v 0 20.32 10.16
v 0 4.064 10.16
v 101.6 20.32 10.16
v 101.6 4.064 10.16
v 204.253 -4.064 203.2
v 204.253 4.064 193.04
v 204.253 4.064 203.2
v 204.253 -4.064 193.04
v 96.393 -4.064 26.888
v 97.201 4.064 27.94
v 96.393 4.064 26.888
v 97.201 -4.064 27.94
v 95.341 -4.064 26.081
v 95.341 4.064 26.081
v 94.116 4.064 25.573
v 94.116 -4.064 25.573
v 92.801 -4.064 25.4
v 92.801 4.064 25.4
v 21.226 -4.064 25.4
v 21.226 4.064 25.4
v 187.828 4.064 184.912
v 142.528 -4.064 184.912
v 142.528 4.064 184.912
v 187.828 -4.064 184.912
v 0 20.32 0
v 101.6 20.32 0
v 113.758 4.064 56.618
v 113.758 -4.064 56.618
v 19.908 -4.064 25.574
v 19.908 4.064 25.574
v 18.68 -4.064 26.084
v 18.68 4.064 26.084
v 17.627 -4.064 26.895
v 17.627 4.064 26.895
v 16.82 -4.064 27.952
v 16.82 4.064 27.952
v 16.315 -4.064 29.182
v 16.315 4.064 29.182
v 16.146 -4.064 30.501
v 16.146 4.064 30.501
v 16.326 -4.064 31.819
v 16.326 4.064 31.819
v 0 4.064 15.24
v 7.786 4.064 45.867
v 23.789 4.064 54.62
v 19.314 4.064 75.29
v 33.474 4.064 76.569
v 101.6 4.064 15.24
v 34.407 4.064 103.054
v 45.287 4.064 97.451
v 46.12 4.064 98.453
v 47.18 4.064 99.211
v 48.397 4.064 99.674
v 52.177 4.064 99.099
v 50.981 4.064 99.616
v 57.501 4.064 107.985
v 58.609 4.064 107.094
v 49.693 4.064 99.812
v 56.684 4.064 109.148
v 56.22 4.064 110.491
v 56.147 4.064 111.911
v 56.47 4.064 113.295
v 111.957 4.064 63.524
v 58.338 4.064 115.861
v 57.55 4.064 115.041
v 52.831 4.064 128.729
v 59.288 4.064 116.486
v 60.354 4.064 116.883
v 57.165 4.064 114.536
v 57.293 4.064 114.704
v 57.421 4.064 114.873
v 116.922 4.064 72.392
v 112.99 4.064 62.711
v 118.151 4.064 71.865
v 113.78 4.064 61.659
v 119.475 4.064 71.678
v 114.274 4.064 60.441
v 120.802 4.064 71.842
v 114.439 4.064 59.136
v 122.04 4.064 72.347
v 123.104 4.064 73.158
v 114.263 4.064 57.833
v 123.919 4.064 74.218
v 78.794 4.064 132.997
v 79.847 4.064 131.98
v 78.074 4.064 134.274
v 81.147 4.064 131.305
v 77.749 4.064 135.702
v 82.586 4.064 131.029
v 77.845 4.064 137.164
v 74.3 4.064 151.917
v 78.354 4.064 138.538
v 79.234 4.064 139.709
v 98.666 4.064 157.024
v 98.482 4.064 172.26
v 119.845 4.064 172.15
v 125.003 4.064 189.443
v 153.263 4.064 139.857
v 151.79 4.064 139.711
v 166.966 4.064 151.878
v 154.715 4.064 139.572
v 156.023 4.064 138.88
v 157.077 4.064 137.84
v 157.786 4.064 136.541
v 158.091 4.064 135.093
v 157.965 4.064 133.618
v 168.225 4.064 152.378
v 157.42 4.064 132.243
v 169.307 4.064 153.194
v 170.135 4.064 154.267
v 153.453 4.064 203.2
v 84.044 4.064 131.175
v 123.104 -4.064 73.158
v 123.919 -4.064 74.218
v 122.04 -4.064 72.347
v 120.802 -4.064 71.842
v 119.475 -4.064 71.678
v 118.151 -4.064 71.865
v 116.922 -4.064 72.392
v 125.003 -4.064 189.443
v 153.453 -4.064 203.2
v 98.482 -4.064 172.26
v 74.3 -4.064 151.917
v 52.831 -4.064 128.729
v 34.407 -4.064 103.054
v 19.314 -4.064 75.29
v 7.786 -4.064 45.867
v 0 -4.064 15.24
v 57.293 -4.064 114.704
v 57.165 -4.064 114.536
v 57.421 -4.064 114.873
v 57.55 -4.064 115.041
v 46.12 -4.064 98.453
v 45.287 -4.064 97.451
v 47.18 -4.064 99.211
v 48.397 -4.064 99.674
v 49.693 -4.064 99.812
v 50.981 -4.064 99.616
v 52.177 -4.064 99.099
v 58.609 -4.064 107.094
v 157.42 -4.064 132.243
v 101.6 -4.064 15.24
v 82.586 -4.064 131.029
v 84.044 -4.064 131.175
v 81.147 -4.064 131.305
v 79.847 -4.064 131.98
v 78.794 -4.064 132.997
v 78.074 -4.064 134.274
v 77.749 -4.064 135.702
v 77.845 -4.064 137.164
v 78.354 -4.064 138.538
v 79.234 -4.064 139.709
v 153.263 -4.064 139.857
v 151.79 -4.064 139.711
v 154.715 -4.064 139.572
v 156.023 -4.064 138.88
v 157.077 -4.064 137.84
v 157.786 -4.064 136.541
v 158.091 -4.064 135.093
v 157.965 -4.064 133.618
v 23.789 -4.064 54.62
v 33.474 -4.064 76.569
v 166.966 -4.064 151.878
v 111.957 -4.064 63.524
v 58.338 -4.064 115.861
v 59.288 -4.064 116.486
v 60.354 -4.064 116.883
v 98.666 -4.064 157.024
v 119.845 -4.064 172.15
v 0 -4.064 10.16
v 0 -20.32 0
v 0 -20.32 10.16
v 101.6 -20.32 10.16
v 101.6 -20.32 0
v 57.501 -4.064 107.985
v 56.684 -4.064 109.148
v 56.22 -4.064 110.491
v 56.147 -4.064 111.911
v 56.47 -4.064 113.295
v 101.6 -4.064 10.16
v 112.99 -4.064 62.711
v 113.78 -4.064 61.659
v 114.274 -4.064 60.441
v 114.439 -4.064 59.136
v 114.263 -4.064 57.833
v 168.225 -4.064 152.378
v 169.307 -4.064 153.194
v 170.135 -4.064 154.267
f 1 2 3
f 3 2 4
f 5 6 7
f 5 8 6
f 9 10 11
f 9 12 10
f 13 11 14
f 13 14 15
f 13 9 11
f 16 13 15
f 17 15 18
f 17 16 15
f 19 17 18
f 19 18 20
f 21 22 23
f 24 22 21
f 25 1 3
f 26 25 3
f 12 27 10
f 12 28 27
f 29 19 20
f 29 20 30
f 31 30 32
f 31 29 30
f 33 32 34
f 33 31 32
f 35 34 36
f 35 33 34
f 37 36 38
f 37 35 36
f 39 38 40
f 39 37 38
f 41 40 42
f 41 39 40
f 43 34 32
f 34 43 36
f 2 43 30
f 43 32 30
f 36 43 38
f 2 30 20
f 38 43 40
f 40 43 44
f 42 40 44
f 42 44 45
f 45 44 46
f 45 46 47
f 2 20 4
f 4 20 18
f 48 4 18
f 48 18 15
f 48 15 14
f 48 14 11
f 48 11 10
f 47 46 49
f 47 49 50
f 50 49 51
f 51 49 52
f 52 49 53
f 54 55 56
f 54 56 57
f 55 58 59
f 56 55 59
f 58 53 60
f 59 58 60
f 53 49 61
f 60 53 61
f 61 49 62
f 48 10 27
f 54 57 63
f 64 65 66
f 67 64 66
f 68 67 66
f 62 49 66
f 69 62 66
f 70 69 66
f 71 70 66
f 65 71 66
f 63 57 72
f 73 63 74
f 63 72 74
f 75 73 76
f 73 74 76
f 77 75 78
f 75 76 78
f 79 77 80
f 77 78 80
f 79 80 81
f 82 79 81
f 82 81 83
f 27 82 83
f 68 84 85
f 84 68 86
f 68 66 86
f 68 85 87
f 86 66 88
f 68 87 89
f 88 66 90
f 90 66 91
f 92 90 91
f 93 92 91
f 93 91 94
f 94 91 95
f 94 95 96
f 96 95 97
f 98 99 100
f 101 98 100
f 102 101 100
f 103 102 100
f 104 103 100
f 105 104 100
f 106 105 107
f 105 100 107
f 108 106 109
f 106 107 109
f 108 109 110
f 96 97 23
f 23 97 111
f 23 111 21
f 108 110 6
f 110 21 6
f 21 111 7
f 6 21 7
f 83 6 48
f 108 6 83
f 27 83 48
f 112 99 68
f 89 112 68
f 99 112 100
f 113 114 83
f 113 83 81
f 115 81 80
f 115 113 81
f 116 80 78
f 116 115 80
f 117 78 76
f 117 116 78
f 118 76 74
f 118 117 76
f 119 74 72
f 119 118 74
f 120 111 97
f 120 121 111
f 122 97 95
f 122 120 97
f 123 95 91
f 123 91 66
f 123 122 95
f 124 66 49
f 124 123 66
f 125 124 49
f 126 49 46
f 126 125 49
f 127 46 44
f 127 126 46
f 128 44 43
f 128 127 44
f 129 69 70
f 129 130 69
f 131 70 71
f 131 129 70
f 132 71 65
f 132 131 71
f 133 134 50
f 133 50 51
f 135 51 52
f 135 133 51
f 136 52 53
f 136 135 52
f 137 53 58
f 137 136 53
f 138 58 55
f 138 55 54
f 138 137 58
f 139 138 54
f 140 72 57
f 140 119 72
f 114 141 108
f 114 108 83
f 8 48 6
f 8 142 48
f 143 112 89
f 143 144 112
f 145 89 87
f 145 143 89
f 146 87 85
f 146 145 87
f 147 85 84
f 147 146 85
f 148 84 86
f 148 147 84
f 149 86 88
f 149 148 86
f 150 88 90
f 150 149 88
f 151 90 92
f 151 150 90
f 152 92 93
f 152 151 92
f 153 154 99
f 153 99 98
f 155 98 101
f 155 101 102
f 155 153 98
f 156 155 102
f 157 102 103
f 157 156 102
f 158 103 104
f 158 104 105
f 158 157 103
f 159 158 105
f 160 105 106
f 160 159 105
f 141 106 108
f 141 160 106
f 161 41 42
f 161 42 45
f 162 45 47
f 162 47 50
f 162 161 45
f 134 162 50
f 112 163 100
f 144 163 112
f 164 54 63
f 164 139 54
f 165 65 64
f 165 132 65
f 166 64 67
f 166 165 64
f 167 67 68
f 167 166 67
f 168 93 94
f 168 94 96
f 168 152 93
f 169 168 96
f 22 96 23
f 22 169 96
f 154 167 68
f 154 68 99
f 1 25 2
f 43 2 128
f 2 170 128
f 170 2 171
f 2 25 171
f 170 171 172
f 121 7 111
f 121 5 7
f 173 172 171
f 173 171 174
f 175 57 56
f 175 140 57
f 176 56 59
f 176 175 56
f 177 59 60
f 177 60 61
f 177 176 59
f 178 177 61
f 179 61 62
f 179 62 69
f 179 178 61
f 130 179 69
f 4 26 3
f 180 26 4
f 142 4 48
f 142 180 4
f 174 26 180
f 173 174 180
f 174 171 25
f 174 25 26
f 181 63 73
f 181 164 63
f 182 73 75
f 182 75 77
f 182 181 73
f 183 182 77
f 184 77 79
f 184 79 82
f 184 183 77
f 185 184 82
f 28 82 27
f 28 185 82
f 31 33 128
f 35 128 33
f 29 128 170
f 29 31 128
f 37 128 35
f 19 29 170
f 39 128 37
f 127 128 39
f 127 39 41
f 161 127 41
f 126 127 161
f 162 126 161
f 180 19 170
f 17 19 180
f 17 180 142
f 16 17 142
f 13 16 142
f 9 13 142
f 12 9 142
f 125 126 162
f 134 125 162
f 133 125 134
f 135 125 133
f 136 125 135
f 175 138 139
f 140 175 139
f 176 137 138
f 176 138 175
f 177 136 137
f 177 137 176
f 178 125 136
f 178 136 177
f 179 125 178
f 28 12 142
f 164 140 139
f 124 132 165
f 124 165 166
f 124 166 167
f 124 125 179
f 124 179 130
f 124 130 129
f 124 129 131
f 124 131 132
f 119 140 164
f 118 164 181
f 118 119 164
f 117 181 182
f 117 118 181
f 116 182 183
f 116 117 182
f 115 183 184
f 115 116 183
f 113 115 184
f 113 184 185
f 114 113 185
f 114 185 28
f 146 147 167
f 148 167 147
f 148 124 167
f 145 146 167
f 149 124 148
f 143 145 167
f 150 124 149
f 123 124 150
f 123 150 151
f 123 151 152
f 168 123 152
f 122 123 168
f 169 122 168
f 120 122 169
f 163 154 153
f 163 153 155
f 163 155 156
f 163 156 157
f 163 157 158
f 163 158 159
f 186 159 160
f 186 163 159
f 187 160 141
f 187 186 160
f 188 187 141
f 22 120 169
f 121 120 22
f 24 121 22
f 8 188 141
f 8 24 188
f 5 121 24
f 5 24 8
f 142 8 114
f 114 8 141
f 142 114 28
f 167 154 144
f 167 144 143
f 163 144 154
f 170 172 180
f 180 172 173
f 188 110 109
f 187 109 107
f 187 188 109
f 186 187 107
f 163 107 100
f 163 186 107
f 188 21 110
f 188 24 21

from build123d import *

# Parameters (mm, degrees)
F1_DEPTH = 4.064
F0_W     = 101.6
F0_H     = 10.16
F2_DEPTH = 20.32


with BuildPart() as f1:
    # F0 (on Front) → F1 (new body, symmetric)
    with BuildSketch(Plane.XZ):
        with BuildLine():
            ThreePointArc((153.4528778619, 203.2), (52.8306922848, 128.7287842706), (0, 15.24))
            Line((0, 15.24), (0, 10.16))
            Line((0, 10.16), (101.6, 10.16))
            Line((101.6, 10.16), (101.6, 15.24))
            Line((101.6, 15.24), (204.2528778619, 193.04))
            Line((204.2528778619, 193.04), (204.2528778619, 203.2))
            Line((204.2528778619, 203.2), (153.4528778619, 203.2))
        make_face()
        with BuildLine():
            Line((92.8011818976, 25.4), (21.2264241823, 25.4))
            ThreePointArc((21.2264241823, 25.4), (17.1886545886, 27.397336102), (16.3259964047, 31.8187335794))
            ThreePointArc((16.3259964047, 31.8187335794), (28.3591193477, 65.7147748231), (45.2871385288, 97.4508714067))
            ThreePointArc((45.2871385288, 97.4508714067), (48.3974495661, 99.6739601652), (52.177042611, 99.098777766))
            Line((52.177042611, 99.098777766), (111.9565313489, 63.5238037174))
            ThreePointArc((111.9565313489, 63.5238037174), (114.2741096305, 60.4406934976), (113.7580367399, 56.6183373538))
            Line((113.7580367399, 56.6183373538), (97.2005909488, 27.94))
            ThreePointArc((97.2005909488, 27.94), (95.3411818976, 26.0805909488), (92.8011818976, 25.4))
        make_face(mode=Mode.SUBTRACT)
        with BuildLine():
            Line((60.353951044, 116.8828291829), (151.7897789297, 139.7113057545))
            ThreePointArc((151.7897789297, 139.7113057545), (157.076894511, 137.8404624823), (157.4197225426, 132.2425955082))
            Line((157.4197225426, 132.2425955082), (123.9189236165, 74.217509674))
            ThreePointArc((123.9189236165, 74.217509674), (120.8018707091, 71.8420277322), (116.9216109051, 72.3920433103))
            Line((116.9216109051, 72.3920433103), (58.6091095788, 107.0940082349))
            ThreePointArc((58.6091095788, 107.0940082349), (56.2200964977, 110.4914552728), (57.1645380163, 114.5359651436))
            ThreePointArc((57.1645380163, 114.5359651436), (57.3571583281, 114.7887213361), (57.5501106483, 115.0412241669))
            ThreePointArc((57.5501106483, 115.0412241669), (58.795633634, 116.2001411551), (60.353951044, 116.8828291829))
        make_face(mode=Mode.SUBTRACT)
        with BuildLine():
            Line((142.5279448136, 184.912), (187.828417404, 184.912))
            Line((187.828417404, 184.912), (170.1352936925, 154.2666107871))
            ThreePointArc((170.1352936925, 154.2666107871), (168.7937516154, 152.7500297675), (166.966419203, 151.8779005407))
            Line((166.966419203, 151.8779005407), (84.0438107409, 131.1748909185))
            ThreePointArc((84.0438107409, 131.1748909185), (78.387658406, 133.6095467697), (79.2344546676, 139.7089356276))
            ThreePointArc((79.2344546676, 139.7089356276), (109.0518420167, 164.8719409502), (142.5279448136, 184.912))
        make_face(mode=Mode.SUBTRACT)
    extrude(amount=F1_DEPTH, both=True)

    # F0 (on Front) → F2 (join, symmetric)
    with BuildSketch(Plane.XZ):
        with Locations((50.8, 5.08)):
            Rectangle(F0_W, F0_H)
    extrude(amount=F2_DEPTH, both=True)


solid = f1.part
